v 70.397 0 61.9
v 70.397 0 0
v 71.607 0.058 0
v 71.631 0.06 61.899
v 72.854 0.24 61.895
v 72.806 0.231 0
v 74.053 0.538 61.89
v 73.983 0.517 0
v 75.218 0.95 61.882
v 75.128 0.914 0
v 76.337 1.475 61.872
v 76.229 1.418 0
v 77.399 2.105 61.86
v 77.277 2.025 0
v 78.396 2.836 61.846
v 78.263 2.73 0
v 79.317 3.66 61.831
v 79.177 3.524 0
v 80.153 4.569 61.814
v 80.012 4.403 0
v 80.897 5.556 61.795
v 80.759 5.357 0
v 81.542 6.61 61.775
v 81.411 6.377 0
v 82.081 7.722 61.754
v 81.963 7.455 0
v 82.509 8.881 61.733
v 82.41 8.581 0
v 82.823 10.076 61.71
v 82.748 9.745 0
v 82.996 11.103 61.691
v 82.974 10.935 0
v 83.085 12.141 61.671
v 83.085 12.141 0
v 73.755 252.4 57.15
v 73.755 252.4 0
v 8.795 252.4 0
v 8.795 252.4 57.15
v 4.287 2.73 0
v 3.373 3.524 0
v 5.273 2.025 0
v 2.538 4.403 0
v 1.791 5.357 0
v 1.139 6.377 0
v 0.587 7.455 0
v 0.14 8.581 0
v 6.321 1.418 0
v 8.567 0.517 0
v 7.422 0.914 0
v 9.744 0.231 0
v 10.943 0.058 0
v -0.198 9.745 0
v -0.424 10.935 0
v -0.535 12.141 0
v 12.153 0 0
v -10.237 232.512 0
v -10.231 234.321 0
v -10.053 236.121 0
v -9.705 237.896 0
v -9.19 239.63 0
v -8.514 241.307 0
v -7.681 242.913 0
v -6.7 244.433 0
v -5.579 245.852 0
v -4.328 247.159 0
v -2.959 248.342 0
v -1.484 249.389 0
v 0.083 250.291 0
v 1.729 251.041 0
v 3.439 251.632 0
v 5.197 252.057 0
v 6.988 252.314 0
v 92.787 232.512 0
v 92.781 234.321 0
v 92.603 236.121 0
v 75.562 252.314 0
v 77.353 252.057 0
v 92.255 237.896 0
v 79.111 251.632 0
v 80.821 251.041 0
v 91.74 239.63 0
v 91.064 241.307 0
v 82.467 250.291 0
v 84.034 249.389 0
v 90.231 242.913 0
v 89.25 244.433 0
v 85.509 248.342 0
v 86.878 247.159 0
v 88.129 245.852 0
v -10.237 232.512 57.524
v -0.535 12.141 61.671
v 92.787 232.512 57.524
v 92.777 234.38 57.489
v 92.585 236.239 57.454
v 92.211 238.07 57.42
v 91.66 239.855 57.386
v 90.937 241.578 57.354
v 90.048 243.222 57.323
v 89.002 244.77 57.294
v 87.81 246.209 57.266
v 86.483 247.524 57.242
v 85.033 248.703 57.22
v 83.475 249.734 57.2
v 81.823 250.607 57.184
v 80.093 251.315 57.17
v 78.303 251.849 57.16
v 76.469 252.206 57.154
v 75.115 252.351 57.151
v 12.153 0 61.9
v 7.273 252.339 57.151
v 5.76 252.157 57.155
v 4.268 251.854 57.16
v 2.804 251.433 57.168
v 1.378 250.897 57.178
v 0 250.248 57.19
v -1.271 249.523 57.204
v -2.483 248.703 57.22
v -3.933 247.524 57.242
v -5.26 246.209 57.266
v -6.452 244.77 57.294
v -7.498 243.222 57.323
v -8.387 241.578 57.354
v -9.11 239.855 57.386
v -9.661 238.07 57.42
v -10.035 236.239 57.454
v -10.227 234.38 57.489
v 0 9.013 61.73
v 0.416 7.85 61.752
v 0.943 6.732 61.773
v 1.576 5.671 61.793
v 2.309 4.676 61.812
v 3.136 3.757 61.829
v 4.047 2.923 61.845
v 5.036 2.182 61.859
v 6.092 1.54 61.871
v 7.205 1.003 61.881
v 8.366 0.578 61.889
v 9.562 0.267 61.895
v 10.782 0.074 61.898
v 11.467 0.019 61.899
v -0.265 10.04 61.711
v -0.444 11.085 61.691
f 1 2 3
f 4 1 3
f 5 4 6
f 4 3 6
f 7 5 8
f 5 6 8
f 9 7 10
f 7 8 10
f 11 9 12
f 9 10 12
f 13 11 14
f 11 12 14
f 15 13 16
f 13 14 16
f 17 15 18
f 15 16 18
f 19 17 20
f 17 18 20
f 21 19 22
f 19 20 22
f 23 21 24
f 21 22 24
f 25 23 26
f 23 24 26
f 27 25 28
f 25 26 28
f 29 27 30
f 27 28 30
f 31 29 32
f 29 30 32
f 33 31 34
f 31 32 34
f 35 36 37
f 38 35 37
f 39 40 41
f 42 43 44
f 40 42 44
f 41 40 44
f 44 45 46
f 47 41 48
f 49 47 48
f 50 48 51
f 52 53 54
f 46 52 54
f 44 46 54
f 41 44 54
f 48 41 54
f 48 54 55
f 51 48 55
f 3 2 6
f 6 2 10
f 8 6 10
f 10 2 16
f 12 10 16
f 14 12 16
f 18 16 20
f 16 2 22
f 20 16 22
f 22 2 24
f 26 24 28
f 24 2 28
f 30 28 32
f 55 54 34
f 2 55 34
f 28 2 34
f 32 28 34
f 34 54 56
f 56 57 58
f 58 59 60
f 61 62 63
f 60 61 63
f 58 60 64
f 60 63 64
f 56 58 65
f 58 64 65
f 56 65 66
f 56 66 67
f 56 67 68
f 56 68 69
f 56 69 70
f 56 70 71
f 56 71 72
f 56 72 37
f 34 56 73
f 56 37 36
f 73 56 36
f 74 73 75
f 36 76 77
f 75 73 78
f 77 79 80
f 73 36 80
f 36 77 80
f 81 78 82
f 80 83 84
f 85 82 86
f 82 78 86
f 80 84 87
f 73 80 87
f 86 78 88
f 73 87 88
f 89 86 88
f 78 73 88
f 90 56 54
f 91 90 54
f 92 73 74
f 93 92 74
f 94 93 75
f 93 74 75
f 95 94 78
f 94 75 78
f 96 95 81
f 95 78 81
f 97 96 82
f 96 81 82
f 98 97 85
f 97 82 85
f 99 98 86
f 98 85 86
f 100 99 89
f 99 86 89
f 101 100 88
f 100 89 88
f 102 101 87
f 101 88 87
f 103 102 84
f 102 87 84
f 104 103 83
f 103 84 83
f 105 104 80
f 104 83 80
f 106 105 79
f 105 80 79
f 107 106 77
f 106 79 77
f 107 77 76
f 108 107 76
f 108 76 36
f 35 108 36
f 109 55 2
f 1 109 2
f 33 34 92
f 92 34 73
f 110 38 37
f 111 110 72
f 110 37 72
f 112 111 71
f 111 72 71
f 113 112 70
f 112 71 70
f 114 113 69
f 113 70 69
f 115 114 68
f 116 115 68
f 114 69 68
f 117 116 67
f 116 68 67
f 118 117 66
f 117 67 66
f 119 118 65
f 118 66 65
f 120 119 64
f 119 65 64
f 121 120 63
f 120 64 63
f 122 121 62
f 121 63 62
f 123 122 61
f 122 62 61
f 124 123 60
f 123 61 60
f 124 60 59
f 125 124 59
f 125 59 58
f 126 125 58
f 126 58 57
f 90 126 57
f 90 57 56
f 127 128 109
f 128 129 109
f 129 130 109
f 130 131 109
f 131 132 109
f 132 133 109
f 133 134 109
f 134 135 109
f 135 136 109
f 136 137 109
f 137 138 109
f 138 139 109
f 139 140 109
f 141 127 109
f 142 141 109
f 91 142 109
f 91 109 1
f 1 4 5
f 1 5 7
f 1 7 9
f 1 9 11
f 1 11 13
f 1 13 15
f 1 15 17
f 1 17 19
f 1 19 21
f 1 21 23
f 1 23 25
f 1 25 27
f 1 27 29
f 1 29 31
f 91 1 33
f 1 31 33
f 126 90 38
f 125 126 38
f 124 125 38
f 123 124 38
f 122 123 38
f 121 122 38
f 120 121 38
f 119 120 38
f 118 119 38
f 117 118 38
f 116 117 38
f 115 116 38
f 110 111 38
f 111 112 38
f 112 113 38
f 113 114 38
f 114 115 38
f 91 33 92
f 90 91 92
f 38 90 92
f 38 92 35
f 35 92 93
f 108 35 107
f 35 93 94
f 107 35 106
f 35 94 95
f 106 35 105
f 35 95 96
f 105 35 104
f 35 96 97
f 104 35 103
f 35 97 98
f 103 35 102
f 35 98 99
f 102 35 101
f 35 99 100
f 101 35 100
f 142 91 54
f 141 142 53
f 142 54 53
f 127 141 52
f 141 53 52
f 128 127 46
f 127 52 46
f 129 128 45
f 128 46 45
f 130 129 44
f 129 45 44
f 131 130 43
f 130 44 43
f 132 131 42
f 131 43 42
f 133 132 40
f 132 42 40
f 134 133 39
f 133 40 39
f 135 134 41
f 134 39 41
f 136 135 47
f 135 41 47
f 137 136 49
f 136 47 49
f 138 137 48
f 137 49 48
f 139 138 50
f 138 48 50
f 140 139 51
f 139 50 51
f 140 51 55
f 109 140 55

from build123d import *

# Parameters (mm, degrees)
F1_DEPTH = 61.8998
F3_DEPTH = 92.806324
F4_DEPTH = 25.4


with BuildPart() as f1:
    # F0 (on Top) → F1 (new body)
    with BuildSketch(Plane.XY):
        with BuildLine():
            Line((-10.236888, 232.51189), (-0.534554, 12.141394))
            ThreePointArc((-0.534554, 12.141394), (3.372617, 3.524372), (12.153155, 0))
            Line((12.153155, 0), (70.396845, 0))
            ThreePointArc((70.396845, 0), (79.177383, 3.524372), (83.084554, 12.141394))
            Line((83.084554, 12.141394), (92.786888, 232.51189))
            ThreePointArc((92.786888, 232.51189), (87.518766, 246.520607), (73.755324, 252.3998))
            Line((73.755324, 252.3998), (8.794676, 252.3998))
            ThreePointArc((8.794676, 252.3998), (-4.968766, 246.520607), (-10.236888, 232.51189))
        make_face()
    extrude(amount=F1_DEPTH)

    # F2 (on Right) → F3 (cut, through all)
    with BuildSketch(Plane.YZ):
        Polygon((0, 61.8998), (252.3998, 57.15), (252.3998, 61.8998), align=None)
    extrude(amount=F3_DEPTH, mode=Mode.SUBTRACT)

    # F2 (on Right) → F4 (cut)
    with BuildSketch(Plane.YZ):
        Polygon((0, 61.8998), (252.3998, 57.15), (252.3998, 61.8998), align=None)
    extrude(amount=-F4_DEPTH, mode=Mode.SUBTRACT)


solid = f1.part
